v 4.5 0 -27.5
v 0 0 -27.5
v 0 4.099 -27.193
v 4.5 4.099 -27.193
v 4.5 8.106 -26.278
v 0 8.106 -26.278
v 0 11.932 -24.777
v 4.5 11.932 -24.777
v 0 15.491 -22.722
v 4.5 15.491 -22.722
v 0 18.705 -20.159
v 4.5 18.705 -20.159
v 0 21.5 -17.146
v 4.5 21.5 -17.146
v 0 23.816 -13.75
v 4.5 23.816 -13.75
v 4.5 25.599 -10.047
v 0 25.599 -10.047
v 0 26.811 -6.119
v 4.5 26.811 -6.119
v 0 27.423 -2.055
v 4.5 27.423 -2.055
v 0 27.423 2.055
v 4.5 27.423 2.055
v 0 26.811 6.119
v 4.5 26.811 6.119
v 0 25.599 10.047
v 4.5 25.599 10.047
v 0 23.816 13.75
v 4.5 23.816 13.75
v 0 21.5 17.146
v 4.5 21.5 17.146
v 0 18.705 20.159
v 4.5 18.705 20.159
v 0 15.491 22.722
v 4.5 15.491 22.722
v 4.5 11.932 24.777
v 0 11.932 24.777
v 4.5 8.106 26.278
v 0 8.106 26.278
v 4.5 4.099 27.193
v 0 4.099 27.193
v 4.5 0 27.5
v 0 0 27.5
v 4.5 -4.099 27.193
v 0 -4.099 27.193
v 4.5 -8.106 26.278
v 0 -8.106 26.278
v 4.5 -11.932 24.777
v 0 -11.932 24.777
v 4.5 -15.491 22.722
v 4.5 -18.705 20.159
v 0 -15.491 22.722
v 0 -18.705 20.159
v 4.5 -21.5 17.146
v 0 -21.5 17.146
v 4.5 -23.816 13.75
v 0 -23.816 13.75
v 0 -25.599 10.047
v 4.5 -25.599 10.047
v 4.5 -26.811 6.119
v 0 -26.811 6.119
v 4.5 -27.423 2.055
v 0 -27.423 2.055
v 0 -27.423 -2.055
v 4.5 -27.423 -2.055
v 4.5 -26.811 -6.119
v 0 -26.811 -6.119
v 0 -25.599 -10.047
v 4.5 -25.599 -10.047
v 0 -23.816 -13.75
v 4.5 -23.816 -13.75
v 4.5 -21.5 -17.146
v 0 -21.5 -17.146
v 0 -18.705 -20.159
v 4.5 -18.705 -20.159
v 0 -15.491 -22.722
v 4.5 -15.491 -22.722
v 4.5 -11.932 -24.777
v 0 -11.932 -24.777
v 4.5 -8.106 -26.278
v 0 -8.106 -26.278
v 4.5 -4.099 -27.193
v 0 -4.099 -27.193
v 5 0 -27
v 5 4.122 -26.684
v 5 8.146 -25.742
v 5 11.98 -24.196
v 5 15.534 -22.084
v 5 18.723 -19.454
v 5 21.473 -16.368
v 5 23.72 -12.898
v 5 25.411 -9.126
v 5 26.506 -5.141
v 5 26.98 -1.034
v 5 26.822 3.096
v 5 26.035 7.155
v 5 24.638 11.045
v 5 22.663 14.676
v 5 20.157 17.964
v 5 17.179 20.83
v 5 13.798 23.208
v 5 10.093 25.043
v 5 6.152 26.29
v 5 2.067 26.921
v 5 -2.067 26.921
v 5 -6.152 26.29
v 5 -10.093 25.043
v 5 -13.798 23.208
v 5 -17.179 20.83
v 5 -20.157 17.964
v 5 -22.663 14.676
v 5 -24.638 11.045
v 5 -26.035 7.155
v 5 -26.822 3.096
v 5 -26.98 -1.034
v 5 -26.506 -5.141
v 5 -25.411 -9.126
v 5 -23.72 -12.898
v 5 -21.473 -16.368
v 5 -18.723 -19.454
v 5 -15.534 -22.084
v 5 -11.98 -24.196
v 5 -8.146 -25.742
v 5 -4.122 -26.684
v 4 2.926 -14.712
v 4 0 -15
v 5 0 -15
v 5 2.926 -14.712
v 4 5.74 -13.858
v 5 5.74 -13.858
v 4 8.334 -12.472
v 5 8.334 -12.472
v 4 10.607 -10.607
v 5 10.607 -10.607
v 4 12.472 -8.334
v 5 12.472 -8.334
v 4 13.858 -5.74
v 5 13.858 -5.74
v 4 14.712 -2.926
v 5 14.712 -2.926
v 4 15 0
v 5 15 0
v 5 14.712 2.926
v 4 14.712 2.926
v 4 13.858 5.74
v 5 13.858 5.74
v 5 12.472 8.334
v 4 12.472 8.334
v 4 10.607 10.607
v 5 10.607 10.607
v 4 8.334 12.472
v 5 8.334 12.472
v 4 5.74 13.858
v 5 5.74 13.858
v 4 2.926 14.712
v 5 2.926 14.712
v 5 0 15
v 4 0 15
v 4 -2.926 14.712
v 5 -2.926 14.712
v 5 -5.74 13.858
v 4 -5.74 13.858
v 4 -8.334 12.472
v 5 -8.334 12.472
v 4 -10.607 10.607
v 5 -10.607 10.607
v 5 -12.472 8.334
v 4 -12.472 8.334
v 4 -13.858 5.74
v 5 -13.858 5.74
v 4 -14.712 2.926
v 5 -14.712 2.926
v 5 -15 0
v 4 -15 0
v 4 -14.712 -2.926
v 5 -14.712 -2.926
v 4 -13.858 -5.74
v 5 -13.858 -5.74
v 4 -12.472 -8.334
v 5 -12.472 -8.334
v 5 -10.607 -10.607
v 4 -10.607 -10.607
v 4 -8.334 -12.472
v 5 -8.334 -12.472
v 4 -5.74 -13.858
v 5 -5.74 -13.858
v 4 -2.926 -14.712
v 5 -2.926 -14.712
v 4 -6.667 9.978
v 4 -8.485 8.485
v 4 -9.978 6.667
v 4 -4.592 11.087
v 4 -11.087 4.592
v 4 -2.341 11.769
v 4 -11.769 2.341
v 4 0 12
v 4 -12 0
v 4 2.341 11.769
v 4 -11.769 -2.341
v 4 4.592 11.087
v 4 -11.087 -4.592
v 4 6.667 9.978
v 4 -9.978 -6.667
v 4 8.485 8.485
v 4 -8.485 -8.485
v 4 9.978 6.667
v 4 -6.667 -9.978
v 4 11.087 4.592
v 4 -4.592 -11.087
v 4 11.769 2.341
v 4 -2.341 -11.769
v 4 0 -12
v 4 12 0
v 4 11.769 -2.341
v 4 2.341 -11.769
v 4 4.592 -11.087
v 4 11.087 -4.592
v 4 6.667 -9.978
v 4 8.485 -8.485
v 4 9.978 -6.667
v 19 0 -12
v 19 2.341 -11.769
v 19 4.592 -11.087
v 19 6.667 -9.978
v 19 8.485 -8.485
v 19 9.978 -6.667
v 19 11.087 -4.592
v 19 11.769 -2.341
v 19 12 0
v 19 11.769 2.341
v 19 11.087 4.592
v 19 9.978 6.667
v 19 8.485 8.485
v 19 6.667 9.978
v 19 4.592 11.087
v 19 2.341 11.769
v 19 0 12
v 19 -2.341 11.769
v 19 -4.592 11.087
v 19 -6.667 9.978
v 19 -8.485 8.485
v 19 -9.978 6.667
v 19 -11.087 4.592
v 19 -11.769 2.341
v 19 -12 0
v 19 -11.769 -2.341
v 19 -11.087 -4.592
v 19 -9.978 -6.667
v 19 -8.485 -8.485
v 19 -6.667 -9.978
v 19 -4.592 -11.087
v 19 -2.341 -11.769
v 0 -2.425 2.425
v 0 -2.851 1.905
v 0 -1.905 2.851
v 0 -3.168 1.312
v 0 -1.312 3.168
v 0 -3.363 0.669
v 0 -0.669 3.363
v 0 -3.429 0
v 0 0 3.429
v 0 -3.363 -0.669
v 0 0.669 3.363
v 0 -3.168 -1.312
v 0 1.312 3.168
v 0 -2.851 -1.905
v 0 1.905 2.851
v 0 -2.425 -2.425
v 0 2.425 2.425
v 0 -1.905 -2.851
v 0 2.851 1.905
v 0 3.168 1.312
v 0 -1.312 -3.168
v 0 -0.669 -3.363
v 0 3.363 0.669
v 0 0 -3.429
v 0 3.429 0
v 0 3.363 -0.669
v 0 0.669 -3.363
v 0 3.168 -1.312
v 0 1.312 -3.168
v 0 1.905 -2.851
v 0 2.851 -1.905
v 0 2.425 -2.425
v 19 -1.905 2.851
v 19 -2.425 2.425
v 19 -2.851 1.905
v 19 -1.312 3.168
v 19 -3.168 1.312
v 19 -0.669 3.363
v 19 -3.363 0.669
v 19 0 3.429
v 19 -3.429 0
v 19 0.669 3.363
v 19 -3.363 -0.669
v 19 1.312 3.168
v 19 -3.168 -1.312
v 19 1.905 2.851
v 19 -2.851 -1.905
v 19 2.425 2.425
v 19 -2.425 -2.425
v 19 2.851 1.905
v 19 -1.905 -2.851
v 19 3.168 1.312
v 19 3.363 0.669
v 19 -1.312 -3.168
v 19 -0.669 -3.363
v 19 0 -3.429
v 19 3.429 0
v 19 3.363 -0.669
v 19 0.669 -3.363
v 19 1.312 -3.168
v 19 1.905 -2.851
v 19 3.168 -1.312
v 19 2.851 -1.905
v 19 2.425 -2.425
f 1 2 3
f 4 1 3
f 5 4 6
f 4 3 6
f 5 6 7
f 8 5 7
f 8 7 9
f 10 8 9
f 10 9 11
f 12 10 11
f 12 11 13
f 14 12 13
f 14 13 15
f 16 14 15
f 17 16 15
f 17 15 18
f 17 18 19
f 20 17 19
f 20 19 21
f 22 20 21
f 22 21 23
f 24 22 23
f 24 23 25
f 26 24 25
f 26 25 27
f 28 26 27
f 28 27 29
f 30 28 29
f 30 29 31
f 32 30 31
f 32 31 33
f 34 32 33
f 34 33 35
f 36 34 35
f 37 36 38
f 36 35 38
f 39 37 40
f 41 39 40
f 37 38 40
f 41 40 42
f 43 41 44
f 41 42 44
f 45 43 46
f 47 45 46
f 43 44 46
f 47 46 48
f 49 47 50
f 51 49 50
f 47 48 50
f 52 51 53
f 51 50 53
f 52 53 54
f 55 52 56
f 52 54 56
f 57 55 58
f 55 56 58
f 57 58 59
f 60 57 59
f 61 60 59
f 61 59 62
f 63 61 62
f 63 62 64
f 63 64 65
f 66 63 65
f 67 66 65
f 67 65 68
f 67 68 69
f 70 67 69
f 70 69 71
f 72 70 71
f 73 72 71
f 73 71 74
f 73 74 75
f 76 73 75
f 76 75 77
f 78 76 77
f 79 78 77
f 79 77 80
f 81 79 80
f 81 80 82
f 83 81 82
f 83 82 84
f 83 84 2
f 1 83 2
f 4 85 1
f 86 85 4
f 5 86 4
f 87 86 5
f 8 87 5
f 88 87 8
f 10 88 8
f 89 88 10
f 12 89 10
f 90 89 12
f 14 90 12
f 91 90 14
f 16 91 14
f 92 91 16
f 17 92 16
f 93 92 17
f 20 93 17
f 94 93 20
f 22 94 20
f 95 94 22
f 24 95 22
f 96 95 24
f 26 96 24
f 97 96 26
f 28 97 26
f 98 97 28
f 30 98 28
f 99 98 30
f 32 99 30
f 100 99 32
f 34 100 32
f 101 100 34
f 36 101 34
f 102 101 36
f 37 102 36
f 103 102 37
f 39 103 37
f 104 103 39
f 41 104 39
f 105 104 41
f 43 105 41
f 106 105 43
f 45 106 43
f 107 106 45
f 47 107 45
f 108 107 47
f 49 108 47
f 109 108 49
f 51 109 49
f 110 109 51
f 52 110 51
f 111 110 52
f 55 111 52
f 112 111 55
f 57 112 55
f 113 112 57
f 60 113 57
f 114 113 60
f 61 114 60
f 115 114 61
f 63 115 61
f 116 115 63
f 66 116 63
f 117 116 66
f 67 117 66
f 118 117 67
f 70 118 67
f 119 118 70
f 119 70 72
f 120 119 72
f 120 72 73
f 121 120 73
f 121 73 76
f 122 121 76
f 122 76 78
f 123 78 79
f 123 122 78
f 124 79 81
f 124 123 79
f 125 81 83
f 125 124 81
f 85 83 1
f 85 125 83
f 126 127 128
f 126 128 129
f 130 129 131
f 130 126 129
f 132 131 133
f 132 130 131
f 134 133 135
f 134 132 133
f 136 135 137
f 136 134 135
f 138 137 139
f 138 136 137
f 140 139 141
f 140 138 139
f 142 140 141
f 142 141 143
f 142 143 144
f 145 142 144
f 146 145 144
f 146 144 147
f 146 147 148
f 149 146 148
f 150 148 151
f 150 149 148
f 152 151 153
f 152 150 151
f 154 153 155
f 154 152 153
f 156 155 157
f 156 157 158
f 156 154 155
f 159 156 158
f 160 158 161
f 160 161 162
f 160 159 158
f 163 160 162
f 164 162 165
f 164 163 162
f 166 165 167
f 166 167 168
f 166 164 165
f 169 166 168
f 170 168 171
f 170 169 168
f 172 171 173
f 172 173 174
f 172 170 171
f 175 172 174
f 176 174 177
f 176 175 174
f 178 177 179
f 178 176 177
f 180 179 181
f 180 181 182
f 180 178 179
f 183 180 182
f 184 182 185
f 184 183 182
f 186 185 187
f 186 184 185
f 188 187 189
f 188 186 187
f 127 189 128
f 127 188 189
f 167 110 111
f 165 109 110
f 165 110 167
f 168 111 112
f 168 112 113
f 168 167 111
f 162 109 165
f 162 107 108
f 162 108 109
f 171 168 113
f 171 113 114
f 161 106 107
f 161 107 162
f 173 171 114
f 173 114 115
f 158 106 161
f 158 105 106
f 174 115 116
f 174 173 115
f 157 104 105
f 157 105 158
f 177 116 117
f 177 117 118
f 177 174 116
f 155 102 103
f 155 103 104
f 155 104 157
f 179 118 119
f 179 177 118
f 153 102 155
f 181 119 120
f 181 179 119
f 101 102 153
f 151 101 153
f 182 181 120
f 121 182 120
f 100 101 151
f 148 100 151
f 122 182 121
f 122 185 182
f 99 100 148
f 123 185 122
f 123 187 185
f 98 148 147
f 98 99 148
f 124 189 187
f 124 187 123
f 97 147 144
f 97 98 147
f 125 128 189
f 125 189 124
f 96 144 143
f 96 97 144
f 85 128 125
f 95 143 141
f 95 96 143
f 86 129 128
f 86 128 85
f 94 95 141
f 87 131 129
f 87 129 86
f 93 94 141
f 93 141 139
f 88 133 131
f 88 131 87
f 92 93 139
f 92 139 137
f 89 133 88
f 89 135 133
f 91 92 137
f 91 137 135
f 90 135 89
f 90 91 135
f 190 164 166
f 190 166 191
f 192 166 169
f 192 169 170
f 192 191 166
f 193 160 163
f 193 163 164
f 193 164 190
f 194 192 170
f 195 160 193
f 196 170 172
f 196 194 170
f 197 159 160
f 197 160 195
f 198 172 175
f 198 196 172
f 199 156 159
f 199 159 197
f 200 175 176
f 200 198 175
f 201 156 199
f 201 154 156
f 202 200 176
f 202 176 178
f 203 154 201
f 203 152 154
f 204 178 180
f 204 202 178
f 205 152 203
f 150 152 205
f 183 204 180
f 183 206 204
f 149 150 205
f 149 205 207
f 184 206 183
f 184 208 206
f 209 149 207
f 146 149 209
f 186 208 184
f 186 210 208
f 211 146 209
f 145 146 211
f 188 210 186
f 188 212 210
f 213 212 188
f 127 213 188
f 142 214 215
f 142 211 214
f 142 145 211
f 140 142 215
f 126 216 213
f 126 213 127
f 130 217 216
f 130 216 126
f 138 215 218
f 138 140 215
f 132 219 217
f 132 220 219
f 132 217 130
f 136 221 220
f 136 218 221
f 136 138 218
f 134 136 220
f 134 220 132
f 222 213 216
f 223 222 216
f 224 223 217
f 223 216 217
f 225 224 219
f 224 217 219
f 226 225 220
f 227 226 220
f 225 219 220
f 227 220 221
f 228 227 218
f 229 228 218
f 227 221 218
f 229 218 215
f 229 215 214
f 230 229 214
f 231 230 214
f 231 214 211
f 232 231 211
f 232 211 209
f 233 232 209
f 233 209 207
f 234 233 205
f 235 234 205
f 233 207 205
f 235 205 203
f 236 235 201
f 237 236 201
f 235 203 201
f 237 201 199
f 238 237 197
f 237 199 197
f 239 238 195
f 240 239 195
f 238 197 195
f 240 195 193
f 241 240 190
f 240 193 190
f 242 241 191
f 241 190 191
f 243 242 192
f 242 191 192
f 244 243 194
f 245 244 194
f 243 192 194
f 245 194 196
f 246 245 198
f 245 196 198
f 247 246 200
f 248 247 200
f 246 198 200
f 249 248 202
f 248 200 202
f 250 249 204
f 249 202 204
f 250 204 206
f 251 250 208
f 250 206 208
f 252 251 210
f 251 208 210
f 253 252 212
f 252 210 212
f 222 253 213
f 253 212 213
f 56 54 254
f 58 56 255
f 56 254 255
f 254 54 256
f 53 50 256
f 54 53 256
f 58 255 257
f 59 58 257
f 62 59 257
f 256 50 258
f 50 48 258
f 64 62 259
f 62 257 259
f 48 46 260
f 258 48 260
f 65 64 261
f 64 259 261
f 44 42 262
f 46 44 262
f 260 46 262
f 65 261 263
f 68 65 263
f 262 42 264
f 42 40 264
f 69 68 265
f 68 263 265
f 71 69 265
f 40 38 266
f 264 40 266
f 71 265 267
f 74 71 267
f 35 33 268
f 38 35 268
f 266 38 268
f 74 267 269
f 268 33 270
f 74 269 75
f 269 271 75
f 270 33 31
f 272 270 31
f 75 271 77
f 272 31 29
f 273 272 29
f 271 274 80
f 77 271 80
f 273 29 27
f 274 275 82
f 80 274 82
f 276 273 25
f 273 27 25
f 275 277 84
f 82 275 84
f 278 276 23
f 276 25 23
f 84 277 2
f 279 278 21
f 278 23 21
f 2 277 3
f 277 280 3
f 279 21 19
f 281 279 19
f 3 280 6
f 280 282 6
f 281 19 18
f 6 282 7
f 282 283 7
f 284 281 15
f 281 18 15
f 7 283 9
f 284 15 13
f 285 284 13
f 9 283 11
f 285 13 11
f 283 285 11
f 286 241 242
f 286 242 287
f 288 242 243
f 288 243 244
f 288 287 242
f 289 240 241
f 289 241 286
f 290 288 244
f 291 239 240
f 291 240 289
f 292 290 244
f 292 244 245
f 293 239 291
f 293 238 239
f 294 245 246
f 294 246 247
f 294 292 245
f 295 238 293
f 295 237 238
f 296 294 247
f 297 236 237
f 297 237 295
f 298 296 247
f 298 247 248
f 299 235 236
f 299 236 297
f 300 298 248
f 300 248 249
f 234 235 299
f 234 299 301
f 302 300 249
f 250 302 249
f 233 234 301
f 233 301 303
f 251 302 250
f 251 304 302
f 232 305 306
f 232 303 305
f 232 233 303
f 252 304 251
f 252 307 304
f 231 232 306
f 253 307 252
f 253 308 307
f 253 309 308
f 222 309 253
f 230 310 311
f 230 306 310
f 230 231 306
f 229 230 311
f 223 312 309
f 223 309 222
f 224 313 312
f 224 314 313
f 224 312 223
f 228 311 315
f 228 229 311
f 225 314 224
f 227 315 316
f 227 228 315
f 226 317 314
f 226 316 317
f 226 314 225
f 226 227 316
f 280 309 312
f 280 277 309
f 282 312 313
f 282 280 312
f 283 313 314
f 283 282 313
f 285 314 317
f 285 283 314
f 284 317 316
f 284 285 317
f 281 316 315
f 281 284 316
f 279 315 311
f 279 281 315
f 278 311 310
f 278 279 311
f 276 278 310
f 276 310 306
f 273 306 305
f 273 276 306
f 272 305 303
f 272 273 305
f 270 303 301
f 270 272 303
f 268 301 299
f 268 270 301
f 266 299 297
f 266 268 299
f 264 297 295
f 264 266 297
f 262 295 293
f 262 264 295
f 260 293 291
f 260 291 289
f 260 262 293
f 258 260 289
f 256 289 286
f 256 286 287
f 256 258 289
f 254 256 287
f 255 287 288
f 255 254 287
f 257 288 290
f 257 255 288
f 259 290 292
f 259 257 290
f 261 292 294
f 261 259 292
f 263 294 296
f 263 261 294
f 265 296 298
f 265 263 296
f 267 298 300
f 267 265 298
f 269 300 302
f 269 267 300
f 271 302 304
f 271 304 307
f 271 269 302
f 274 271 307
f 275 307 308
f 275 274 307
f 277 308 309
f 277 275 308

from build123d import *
from build123d.topology import SkipClean

# Parameters (mm, degrees)
SKETCH1_R               = 27.5
BOSS_EXTRUDE1_DEPTH     = 4
SKETCH2_R               = 27.5
SKETCH2_R_2             = 15
BOSS_EXTRUDE2_DEPTH     = 1
CUT_EXTRUDE1_DEPTH      = 40.210967853
CUT_EXTRUDE1_DEPTH_BACK = 40.210967853
SKETCH3_R               = 3.429
SKETCH4_R               = 12
SKETCH4_R_2             = 3.429
BOSS_EXTRUDE3_DEPTH     = 15
CHAMFER1_SIZE           = 0.5


with BuildPart() as part:
    # Sketch1 → Boss-Extrude1 (new body)
    with BuildSketch(Plane(origin=(0, 0, 0), x_dir=(0, 0, -1), z_dir=(1, 0, 0))):
        Circle(SKETCH1_R)
    extrude(amount=BOSS_EXTRUDE1_DEPTH)

    # Sketch2 → Boss-Extrude2 (add)
    with BuildSketch(Plane(origin=(4, 0, 0), x_dir=(0, 0, -1), z_dir=(1, 0, 0))):
        Circle(SKETCH2_R)
        Circle(SKETCH2_R_2, mode=Mode.SUBTRACT)
    extrude(amount=BOSS_EXTRUDE2_DEPTH)

    # Sketch3 → Cut-Extrude1 (cut, two sides: drawn at the far end of the back side and taken through both)
    with BuildSketch(Plane.ZY.offset(-CUT_EXTRUDE1_DEPTH_BACK)):
        Circle(SKETCH3_R)
    extrude(amount=CUT_EXTRUDE1_DEPTH + CUT_EXTRUDE1_DEPTH_BACK, mode=Mode.SUBTRACT)

    # Sketch4 → Boss-Extrude3 (add)
    with SkipClean():  # the faces are left unmerged after this step: merging them gives an invalid solid
        with BuildSketch(Plane(origin=(4, 0, 0), x_dir=(0, 0, -1), z_dir=(1, 0, 0))):
            Circle(SKETCH4_R)
            Circle(SKETCH4_R_2, mode=Mode.SUBTRACT)
        extrude(amount=BOSS_EXTRUDE3_DEPTH)

    # Chamfer1
    chamfer1_edges = [part.edges().sort_by_distance(p)[0] for p in [
        (5, 0, 27.5),
    ]]
    chamfer(chamfer1_edges, length=CHAMFER1_SIZE)


solid = part.part
